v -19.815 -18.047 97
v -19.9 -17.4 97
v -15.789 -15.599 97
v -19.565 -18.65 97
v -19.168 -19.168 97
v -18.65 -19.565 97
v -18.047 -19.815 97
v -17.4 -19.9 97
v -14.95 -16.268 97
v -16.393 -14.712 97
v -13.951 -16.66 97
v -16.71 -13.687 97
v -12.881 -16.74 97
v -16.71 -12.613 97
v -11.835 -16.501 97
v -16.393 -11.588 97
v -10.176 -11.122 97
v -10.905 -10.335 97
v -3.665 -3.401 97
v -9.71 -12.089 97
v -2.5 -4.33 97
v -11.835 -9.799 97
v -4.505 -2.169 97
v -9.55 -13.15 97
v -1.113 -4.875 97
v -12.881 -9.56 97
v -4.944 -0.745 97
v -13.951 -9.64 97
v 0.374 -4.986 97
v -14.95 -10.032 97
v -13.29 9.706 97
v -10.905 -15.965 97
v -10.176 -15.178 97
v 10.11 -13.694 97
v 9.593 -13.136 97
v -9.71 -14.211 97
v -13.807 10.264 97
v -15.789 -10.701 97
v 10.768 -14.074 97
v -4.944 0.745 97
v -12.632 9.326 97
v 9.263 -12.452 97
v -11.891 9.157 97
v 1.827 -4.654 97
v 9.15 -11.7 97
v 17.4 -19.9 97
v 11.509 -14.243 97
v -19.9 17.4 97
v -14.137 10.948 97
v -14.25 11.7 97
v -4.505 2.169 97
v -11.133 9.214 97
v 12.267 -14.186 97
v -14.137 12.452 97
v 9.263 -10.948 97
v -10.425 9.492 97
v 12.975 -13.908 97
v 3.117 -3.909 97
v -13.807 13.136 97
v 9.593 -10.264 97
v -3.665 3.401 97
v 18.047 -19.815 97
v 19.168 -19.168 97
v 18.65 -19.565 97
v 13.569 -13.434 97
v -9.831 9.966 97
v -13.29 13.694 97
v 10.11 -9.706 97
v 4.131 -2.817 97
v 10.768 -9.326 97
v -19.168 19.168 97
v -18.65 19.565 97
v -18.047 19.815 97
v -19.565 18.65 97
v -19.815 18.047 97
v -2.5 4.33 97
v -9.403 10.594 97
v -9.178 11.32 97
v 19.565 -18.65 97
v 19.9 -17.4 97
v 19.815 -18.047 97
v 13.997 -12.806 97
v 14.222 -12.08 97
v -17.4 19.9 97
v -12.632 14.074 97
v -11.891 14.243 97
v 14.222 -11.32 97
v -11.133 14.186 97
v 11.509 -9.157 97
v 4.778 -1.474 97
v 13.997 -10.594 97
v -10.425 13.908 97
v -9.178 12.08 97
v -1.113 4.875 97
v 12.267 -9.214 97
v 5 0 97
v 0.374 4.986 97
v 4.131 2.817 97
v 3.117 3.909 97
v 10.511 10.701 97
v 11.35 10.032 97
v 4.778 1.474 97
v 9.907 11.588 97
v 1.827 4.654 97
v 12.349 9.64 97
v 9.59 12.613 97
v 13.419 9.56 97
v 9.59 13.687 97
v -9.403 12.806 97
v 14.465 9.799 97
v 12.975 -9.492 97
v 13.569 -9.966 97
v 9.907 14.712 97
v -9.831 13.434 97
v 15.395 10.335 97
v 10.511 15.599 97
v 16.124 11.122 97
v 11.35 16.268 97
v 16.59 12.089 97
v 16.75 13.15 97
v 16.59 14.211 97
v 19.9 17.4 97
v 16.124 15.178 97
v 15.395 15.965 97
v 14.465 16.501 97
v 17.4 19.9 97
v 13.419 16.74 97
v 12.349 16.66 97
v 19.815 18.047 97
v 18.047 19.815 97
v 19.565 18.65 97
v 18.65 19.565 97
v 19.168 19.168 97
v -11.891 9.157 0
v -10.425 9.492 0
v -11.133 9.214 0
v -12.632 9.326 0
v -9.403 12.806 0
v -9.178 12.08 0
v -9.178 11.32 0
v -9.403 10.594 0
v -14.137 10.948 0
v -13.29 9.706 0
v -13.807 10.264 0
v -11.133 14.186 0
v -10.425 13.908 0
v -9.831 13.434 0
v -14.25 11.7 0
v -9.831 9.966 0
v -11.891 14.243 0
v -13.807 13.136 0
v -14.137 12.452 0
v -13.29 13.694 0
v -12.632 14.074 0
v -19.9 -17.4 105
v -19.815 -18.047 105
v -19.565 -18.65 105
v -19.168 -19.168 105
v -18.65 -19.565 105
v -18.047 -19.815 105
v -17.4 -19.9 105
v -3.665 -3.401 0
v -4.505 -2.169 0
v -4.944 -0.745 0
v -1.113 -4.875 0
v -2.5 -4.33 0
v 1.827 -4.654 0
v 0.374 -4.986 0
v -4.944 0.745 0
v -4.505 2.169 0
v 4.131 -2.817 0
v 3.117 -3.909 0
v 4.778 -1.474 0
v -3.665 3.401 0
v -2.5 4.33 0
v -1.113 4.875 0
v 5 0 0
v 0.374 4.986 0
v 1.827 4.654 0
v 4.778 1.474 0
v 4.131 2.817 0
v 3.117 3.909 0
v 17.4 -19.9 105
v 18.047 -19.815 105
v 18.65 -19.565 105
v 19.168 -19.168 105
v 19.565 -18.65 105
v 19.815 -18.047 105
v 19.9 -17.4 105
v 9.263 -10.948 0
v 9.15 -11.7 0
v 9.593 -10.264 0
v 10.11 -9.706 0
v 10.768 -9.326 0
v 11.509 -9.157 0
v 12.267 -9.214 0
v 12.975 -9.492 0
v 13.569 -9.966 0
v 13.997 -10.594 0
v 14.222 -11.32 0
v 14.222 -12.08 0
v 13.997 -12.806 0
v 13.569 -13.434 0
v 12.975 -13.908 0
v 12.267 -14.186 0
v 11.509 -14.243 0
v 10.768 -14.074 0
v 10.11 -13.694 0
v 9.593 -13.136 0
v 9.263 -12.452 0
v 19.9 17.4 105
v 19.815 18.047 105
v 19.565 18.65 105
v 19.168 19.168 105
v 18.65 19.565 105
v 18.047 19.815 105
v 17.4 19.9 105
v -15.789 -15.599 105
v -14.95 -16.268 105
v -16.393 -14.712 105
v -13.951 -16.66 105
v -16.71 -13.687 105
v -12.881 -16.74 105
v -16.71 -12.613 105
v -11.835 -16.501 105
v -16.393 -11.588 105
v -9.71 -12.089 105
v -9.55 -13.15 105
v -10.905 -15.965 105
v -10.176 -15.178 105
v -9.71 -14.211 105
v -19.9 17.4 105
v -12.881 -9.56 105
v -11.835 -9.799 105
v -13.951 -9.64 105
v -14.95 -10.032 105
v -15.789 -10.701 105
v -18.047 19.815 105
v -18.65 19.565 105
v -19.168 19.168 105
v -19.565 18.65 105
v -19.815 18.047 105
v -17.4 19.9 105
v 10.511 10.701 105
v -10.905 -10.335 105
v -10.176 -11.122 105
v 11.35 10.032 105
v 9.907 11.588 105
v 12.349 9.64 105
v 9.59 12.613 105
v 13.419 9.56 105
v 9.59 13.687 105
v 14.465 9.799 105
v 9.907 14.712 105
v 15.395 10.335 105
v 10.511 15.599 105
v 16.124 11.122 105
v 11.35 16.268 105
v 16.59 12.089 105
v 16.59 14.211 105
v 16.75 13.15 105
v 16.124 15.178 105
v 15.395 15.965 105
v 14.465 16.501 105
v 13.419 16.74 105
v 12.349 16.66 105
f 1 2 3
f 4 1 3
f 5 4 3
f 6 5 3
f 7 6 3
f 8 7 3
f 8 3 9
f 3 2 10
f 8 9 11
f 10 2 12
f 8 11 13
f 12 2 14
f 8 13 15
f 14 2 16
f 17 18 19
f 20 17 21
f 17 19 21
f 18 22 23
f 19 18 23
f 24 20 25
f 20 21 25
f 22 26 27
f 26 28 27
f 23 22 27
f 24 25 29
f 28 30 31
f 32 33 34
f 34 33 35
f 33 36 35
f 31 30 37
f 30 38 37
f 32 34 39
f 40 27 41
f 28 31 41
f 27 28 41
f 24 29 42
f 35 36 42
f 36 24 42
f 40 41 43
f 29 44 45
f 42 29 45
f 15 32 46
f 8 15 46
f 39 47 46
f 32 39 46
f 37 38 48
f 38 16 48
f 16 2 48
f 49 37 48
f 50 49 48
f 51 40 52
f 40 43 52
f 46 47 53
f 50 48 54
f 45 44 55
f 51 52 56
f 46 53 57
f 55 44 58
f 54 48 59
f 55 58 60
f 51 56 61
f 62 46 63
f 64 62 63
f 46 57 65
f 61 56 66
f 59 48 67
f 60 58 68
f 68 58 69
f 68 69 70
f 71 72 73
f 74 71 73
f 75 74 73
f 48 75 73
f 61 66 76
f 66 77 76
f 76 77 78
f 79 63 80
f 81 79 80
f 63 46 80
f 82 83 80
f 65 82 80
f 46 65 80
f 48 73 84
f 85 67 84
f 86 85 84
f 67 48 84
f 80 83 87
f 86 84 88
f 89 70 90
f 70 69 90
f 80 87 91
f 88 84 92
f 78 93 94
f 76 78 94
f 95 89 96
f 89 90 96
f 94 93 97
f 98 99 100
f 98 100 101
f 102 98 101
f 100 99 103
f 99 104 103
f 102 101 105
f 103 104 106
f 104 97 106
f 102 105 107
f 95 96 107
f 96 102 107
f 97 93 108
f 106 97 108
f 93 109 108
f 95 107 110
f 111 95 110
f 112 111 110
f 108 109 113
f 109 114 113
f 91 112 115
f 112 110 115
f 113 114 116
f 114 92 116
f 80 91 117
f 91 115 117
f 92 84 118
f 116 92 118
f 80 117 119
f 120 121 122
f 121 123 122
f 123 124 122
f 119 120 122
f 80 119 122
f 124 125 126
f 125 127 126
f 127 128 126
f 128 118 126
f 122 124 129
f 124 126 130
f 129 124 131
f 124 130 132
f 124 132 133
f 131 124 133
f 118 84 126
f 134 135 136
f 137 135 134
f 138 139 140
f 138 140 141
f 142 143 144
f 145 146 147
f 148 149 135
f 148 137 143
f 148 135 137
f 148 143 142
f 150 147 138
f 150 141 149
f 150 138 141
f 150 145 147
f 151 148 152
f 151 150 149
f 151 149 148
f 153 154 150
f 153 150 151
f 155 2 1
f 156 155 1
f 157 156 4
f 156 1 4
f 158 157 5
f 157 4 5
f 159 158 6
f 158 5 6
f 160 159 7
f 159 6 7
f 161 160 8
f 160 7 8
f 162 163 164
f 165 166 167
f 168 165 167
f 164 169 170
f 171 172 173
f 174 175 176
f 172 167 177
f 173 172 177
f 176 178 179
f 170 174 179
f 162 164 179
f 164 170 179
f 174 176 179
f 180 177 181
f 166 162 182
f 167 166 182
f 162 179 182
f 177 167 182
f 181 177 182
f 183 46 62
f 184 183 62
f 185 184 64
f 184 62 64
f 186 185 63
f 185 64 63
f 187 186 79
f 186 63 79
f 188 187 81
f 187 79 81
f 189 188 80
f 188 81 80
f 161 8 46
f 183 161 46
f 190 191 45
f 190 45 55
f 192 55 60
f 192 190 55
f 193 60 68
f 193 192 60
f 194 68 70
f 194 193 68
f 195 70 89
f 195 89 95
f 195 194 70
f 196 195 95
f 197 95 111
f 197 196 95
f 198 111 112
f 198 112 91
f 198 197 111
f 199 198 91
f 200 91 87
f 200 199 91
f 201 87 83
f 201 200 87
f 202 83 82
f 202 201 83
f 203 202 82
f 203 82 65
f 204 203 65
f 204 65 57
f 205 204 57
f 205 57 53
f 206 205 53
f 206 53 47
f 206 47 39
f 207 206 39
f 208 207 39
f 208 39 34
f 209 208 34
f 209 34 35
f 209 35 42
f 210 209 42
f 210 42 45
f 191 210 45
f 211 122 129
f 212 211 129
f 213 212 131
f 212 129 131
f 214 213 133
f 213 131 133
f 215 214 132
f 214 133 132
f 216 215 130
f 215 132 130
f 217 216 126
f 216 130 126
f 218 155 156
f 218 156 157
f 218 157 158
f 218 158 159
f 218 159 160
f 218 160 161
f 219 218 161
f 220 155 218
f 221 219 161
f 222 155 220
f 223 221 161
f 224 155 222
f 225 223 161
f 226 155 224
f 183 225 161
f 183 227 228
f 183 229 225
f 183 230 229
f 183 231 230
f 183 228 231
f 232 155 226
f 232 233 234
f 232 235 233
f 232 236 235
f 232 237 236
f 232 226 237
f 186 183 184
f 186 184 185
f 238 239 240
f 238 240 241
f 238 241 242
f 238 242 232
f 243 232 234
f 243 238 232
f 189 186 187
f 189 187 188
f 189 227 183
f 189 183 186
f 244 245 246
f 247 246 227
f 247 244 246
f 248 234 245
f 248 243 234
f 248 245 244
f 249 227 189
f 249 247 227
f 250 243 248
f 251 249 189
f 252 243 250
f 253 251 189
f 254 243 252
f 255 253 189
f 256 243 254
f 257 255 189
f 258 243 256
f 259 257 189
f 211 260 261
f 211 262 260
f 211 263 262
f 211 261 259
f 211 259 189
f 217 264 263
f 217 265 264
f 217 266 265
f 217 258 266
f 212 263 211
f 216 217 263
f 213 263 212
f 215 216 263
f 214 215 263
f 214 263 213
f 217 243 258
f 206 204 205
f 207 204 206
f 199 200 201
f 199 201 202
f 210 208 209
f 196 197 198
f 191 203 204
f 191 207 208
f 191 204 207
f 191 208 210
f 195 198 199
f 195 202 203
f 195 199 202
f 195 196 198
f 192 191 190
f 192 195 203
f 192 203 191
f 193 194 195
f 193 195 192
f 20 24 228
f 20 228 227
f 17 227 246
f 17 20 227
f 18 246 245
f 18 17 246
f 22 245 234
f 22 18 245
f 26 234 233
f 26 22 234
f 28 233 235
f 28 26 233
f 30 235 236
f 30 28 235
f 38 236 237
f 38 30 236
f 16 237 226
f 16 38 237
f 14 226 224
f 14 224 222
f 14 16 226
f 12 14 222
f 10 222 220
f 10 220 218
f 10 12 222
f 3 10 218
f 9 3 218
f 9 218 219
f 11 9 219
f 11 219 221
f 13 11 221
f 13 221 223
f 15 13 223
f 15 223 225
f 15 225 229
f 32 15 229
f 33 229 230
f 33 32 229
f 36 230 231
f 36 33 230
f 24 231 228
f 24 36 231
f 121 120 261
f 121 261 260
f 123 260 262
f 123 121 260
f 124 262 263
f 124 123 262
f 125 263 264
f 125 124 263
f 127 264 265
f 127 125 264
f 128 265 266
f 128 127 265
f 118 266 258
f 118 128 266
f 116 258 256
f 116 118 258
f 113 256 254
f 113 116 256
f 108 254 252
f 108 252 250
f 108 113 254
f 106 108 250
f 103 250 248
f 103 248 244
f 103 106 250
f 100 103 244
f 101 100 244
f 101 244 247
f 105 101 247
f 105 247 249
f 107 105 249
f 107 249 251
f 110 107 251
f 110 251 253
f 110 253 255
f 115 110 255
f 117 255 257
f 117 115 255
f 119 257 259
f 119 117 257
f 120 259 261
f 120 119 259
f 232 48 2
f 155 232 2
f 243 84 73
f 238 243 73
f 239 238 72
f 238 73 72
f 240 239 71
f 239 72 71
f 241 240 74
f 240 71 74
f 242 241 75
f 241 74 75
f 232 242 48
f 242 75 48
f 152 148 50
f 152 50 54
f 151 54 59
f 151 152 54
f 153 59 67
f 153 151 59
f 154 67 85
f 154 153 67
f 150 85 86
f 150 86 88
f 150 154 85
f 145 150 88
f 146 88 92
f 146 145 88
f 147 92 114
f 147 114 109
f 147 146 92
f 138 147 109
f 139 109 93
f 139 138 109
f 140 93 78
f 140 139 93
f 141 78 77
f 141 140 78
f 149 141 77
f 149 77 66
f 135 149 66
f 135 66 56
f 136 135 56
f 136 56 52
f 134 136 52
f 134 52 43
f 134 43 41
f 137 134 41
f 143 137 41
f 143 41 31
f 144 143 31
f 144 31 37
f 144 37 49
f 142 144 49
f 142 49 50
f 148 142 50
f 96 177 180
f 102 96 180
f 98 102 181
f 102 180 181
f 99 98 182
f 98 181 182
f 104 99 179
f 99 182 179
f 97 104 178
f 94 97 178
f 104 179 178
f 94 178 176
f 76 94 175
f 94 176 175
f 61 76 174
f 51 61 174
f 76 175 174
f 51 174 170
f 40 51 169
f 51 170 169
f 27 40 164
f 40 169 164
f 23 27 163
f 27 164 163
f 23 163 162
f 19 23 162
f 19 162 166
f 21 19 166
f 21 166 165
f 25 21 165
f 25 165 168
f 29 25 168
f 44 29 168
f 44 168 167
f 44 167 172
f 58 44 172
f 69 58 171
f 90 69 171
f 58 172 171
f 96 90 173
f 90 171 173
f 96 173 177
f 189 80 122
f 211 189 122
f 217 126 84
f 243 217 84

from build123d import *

# Parameters (mm, degrees)
SKETCH1_R           = 5
BOSS_EXTRUDE1_DEPTH = 97
SKETCH2_R           = 3.6
BOSS_EXTRUDE2_DEPTH = 8
BOSS_EXTRUDE3_REACH = 107
SKETCH4_R           = 2.55


with BuildPart() as part:
    # Sketch1 → Boss-Extrude1 (new body)
    with BuildSketch(Plane.XY):
        Circle(SKETCH1_R)
    extrude(amount=BOSS_EXTRUDE1_DEPTH)

    # Sketch2 → Boss-Extrude2 (add)
    with BuildSketch(Plane.XY.offset(97)):
        with BuildLine():
            Line((-17.4, -19.9), (17.4, -19.9))
            ThreePointArc((17.4, -19.9), (19.167766953, -19.167766953), (19.9, -17.4))
            Line((19.9, -17.4), (19.9, 17.4))
            ThreePointArc((19.9, 17.4), (19.167766953, 19.167766953), (17.4, 19.9))
            Line((17.4, 19.9), (-17.4, 19.9))
            ThreePointArc((-17.4, 19.9), (-19.167766953, 19.167766953), (-19.9, 17.4))
            Line((-19.9, 17.4), (-19.9, -17.4))
            ThreePointArc((-19.9, -17.4), (-19.167766953, -19.167766953), (-17.4, -19.9))
        make_face()
        with Locations((13.15, 13.15)):
            Circle(SKETCH2_R, mode=Mode.SUBTRACT)
        with Locations((-13.15, -13.15)):
            Circle(SKETCH2_R, mode=Mode.SUBTRACT)
    extrude(amount=BOSS_EXTRUDE2_DEPTH)

    # Sketch4 → Boss-Extrude3 (add, up to next)
    with BuildSketch(Plane(origin=(0, 0, 0), x_dir=(-1, 0, 0), z_dir=(0, 0, -1)), mode=Mode.PRIVATE) as boss_extrude3_sk1:
        with Locations((-11.7, -11.7)):
            Circle(SKETCH4_R)
    boss_extrude3_tool1 = extrude(boss_extrude3_sk1.sketch, amount=-BOSS_EXTRUDE3_REACH, mode=Mode.PRIVATE) - part.part
    add(boss_extrude3_tool1.solids().sort_by_distance((11.7, -11.7, 0))[0])
    # Sketch4 → Boss-Extrude3 (add, up to next)
    with BuildSketch(Plane(origin=(0, 0, 0), x_dir=(-1, 0, 0), z_dir=(0, 0, -1)), mode=Mode.PRIVATE) as boss_extrude3_sk2:
        with Locations((11.7, 11.7)):
            Circle(SKETCH4_R)
    boss_extrude3_tool2 = extrude(boss_extrude3_sk2.sketch, amount=-BOSS_EXTRUDE3_REACH, mode=Mode.PRIVATE) - part.part
    add(boss_extrude3_tool2.solids().sort_by_distance((-11.7, 11.7, 0))[0])


solid = part.part
